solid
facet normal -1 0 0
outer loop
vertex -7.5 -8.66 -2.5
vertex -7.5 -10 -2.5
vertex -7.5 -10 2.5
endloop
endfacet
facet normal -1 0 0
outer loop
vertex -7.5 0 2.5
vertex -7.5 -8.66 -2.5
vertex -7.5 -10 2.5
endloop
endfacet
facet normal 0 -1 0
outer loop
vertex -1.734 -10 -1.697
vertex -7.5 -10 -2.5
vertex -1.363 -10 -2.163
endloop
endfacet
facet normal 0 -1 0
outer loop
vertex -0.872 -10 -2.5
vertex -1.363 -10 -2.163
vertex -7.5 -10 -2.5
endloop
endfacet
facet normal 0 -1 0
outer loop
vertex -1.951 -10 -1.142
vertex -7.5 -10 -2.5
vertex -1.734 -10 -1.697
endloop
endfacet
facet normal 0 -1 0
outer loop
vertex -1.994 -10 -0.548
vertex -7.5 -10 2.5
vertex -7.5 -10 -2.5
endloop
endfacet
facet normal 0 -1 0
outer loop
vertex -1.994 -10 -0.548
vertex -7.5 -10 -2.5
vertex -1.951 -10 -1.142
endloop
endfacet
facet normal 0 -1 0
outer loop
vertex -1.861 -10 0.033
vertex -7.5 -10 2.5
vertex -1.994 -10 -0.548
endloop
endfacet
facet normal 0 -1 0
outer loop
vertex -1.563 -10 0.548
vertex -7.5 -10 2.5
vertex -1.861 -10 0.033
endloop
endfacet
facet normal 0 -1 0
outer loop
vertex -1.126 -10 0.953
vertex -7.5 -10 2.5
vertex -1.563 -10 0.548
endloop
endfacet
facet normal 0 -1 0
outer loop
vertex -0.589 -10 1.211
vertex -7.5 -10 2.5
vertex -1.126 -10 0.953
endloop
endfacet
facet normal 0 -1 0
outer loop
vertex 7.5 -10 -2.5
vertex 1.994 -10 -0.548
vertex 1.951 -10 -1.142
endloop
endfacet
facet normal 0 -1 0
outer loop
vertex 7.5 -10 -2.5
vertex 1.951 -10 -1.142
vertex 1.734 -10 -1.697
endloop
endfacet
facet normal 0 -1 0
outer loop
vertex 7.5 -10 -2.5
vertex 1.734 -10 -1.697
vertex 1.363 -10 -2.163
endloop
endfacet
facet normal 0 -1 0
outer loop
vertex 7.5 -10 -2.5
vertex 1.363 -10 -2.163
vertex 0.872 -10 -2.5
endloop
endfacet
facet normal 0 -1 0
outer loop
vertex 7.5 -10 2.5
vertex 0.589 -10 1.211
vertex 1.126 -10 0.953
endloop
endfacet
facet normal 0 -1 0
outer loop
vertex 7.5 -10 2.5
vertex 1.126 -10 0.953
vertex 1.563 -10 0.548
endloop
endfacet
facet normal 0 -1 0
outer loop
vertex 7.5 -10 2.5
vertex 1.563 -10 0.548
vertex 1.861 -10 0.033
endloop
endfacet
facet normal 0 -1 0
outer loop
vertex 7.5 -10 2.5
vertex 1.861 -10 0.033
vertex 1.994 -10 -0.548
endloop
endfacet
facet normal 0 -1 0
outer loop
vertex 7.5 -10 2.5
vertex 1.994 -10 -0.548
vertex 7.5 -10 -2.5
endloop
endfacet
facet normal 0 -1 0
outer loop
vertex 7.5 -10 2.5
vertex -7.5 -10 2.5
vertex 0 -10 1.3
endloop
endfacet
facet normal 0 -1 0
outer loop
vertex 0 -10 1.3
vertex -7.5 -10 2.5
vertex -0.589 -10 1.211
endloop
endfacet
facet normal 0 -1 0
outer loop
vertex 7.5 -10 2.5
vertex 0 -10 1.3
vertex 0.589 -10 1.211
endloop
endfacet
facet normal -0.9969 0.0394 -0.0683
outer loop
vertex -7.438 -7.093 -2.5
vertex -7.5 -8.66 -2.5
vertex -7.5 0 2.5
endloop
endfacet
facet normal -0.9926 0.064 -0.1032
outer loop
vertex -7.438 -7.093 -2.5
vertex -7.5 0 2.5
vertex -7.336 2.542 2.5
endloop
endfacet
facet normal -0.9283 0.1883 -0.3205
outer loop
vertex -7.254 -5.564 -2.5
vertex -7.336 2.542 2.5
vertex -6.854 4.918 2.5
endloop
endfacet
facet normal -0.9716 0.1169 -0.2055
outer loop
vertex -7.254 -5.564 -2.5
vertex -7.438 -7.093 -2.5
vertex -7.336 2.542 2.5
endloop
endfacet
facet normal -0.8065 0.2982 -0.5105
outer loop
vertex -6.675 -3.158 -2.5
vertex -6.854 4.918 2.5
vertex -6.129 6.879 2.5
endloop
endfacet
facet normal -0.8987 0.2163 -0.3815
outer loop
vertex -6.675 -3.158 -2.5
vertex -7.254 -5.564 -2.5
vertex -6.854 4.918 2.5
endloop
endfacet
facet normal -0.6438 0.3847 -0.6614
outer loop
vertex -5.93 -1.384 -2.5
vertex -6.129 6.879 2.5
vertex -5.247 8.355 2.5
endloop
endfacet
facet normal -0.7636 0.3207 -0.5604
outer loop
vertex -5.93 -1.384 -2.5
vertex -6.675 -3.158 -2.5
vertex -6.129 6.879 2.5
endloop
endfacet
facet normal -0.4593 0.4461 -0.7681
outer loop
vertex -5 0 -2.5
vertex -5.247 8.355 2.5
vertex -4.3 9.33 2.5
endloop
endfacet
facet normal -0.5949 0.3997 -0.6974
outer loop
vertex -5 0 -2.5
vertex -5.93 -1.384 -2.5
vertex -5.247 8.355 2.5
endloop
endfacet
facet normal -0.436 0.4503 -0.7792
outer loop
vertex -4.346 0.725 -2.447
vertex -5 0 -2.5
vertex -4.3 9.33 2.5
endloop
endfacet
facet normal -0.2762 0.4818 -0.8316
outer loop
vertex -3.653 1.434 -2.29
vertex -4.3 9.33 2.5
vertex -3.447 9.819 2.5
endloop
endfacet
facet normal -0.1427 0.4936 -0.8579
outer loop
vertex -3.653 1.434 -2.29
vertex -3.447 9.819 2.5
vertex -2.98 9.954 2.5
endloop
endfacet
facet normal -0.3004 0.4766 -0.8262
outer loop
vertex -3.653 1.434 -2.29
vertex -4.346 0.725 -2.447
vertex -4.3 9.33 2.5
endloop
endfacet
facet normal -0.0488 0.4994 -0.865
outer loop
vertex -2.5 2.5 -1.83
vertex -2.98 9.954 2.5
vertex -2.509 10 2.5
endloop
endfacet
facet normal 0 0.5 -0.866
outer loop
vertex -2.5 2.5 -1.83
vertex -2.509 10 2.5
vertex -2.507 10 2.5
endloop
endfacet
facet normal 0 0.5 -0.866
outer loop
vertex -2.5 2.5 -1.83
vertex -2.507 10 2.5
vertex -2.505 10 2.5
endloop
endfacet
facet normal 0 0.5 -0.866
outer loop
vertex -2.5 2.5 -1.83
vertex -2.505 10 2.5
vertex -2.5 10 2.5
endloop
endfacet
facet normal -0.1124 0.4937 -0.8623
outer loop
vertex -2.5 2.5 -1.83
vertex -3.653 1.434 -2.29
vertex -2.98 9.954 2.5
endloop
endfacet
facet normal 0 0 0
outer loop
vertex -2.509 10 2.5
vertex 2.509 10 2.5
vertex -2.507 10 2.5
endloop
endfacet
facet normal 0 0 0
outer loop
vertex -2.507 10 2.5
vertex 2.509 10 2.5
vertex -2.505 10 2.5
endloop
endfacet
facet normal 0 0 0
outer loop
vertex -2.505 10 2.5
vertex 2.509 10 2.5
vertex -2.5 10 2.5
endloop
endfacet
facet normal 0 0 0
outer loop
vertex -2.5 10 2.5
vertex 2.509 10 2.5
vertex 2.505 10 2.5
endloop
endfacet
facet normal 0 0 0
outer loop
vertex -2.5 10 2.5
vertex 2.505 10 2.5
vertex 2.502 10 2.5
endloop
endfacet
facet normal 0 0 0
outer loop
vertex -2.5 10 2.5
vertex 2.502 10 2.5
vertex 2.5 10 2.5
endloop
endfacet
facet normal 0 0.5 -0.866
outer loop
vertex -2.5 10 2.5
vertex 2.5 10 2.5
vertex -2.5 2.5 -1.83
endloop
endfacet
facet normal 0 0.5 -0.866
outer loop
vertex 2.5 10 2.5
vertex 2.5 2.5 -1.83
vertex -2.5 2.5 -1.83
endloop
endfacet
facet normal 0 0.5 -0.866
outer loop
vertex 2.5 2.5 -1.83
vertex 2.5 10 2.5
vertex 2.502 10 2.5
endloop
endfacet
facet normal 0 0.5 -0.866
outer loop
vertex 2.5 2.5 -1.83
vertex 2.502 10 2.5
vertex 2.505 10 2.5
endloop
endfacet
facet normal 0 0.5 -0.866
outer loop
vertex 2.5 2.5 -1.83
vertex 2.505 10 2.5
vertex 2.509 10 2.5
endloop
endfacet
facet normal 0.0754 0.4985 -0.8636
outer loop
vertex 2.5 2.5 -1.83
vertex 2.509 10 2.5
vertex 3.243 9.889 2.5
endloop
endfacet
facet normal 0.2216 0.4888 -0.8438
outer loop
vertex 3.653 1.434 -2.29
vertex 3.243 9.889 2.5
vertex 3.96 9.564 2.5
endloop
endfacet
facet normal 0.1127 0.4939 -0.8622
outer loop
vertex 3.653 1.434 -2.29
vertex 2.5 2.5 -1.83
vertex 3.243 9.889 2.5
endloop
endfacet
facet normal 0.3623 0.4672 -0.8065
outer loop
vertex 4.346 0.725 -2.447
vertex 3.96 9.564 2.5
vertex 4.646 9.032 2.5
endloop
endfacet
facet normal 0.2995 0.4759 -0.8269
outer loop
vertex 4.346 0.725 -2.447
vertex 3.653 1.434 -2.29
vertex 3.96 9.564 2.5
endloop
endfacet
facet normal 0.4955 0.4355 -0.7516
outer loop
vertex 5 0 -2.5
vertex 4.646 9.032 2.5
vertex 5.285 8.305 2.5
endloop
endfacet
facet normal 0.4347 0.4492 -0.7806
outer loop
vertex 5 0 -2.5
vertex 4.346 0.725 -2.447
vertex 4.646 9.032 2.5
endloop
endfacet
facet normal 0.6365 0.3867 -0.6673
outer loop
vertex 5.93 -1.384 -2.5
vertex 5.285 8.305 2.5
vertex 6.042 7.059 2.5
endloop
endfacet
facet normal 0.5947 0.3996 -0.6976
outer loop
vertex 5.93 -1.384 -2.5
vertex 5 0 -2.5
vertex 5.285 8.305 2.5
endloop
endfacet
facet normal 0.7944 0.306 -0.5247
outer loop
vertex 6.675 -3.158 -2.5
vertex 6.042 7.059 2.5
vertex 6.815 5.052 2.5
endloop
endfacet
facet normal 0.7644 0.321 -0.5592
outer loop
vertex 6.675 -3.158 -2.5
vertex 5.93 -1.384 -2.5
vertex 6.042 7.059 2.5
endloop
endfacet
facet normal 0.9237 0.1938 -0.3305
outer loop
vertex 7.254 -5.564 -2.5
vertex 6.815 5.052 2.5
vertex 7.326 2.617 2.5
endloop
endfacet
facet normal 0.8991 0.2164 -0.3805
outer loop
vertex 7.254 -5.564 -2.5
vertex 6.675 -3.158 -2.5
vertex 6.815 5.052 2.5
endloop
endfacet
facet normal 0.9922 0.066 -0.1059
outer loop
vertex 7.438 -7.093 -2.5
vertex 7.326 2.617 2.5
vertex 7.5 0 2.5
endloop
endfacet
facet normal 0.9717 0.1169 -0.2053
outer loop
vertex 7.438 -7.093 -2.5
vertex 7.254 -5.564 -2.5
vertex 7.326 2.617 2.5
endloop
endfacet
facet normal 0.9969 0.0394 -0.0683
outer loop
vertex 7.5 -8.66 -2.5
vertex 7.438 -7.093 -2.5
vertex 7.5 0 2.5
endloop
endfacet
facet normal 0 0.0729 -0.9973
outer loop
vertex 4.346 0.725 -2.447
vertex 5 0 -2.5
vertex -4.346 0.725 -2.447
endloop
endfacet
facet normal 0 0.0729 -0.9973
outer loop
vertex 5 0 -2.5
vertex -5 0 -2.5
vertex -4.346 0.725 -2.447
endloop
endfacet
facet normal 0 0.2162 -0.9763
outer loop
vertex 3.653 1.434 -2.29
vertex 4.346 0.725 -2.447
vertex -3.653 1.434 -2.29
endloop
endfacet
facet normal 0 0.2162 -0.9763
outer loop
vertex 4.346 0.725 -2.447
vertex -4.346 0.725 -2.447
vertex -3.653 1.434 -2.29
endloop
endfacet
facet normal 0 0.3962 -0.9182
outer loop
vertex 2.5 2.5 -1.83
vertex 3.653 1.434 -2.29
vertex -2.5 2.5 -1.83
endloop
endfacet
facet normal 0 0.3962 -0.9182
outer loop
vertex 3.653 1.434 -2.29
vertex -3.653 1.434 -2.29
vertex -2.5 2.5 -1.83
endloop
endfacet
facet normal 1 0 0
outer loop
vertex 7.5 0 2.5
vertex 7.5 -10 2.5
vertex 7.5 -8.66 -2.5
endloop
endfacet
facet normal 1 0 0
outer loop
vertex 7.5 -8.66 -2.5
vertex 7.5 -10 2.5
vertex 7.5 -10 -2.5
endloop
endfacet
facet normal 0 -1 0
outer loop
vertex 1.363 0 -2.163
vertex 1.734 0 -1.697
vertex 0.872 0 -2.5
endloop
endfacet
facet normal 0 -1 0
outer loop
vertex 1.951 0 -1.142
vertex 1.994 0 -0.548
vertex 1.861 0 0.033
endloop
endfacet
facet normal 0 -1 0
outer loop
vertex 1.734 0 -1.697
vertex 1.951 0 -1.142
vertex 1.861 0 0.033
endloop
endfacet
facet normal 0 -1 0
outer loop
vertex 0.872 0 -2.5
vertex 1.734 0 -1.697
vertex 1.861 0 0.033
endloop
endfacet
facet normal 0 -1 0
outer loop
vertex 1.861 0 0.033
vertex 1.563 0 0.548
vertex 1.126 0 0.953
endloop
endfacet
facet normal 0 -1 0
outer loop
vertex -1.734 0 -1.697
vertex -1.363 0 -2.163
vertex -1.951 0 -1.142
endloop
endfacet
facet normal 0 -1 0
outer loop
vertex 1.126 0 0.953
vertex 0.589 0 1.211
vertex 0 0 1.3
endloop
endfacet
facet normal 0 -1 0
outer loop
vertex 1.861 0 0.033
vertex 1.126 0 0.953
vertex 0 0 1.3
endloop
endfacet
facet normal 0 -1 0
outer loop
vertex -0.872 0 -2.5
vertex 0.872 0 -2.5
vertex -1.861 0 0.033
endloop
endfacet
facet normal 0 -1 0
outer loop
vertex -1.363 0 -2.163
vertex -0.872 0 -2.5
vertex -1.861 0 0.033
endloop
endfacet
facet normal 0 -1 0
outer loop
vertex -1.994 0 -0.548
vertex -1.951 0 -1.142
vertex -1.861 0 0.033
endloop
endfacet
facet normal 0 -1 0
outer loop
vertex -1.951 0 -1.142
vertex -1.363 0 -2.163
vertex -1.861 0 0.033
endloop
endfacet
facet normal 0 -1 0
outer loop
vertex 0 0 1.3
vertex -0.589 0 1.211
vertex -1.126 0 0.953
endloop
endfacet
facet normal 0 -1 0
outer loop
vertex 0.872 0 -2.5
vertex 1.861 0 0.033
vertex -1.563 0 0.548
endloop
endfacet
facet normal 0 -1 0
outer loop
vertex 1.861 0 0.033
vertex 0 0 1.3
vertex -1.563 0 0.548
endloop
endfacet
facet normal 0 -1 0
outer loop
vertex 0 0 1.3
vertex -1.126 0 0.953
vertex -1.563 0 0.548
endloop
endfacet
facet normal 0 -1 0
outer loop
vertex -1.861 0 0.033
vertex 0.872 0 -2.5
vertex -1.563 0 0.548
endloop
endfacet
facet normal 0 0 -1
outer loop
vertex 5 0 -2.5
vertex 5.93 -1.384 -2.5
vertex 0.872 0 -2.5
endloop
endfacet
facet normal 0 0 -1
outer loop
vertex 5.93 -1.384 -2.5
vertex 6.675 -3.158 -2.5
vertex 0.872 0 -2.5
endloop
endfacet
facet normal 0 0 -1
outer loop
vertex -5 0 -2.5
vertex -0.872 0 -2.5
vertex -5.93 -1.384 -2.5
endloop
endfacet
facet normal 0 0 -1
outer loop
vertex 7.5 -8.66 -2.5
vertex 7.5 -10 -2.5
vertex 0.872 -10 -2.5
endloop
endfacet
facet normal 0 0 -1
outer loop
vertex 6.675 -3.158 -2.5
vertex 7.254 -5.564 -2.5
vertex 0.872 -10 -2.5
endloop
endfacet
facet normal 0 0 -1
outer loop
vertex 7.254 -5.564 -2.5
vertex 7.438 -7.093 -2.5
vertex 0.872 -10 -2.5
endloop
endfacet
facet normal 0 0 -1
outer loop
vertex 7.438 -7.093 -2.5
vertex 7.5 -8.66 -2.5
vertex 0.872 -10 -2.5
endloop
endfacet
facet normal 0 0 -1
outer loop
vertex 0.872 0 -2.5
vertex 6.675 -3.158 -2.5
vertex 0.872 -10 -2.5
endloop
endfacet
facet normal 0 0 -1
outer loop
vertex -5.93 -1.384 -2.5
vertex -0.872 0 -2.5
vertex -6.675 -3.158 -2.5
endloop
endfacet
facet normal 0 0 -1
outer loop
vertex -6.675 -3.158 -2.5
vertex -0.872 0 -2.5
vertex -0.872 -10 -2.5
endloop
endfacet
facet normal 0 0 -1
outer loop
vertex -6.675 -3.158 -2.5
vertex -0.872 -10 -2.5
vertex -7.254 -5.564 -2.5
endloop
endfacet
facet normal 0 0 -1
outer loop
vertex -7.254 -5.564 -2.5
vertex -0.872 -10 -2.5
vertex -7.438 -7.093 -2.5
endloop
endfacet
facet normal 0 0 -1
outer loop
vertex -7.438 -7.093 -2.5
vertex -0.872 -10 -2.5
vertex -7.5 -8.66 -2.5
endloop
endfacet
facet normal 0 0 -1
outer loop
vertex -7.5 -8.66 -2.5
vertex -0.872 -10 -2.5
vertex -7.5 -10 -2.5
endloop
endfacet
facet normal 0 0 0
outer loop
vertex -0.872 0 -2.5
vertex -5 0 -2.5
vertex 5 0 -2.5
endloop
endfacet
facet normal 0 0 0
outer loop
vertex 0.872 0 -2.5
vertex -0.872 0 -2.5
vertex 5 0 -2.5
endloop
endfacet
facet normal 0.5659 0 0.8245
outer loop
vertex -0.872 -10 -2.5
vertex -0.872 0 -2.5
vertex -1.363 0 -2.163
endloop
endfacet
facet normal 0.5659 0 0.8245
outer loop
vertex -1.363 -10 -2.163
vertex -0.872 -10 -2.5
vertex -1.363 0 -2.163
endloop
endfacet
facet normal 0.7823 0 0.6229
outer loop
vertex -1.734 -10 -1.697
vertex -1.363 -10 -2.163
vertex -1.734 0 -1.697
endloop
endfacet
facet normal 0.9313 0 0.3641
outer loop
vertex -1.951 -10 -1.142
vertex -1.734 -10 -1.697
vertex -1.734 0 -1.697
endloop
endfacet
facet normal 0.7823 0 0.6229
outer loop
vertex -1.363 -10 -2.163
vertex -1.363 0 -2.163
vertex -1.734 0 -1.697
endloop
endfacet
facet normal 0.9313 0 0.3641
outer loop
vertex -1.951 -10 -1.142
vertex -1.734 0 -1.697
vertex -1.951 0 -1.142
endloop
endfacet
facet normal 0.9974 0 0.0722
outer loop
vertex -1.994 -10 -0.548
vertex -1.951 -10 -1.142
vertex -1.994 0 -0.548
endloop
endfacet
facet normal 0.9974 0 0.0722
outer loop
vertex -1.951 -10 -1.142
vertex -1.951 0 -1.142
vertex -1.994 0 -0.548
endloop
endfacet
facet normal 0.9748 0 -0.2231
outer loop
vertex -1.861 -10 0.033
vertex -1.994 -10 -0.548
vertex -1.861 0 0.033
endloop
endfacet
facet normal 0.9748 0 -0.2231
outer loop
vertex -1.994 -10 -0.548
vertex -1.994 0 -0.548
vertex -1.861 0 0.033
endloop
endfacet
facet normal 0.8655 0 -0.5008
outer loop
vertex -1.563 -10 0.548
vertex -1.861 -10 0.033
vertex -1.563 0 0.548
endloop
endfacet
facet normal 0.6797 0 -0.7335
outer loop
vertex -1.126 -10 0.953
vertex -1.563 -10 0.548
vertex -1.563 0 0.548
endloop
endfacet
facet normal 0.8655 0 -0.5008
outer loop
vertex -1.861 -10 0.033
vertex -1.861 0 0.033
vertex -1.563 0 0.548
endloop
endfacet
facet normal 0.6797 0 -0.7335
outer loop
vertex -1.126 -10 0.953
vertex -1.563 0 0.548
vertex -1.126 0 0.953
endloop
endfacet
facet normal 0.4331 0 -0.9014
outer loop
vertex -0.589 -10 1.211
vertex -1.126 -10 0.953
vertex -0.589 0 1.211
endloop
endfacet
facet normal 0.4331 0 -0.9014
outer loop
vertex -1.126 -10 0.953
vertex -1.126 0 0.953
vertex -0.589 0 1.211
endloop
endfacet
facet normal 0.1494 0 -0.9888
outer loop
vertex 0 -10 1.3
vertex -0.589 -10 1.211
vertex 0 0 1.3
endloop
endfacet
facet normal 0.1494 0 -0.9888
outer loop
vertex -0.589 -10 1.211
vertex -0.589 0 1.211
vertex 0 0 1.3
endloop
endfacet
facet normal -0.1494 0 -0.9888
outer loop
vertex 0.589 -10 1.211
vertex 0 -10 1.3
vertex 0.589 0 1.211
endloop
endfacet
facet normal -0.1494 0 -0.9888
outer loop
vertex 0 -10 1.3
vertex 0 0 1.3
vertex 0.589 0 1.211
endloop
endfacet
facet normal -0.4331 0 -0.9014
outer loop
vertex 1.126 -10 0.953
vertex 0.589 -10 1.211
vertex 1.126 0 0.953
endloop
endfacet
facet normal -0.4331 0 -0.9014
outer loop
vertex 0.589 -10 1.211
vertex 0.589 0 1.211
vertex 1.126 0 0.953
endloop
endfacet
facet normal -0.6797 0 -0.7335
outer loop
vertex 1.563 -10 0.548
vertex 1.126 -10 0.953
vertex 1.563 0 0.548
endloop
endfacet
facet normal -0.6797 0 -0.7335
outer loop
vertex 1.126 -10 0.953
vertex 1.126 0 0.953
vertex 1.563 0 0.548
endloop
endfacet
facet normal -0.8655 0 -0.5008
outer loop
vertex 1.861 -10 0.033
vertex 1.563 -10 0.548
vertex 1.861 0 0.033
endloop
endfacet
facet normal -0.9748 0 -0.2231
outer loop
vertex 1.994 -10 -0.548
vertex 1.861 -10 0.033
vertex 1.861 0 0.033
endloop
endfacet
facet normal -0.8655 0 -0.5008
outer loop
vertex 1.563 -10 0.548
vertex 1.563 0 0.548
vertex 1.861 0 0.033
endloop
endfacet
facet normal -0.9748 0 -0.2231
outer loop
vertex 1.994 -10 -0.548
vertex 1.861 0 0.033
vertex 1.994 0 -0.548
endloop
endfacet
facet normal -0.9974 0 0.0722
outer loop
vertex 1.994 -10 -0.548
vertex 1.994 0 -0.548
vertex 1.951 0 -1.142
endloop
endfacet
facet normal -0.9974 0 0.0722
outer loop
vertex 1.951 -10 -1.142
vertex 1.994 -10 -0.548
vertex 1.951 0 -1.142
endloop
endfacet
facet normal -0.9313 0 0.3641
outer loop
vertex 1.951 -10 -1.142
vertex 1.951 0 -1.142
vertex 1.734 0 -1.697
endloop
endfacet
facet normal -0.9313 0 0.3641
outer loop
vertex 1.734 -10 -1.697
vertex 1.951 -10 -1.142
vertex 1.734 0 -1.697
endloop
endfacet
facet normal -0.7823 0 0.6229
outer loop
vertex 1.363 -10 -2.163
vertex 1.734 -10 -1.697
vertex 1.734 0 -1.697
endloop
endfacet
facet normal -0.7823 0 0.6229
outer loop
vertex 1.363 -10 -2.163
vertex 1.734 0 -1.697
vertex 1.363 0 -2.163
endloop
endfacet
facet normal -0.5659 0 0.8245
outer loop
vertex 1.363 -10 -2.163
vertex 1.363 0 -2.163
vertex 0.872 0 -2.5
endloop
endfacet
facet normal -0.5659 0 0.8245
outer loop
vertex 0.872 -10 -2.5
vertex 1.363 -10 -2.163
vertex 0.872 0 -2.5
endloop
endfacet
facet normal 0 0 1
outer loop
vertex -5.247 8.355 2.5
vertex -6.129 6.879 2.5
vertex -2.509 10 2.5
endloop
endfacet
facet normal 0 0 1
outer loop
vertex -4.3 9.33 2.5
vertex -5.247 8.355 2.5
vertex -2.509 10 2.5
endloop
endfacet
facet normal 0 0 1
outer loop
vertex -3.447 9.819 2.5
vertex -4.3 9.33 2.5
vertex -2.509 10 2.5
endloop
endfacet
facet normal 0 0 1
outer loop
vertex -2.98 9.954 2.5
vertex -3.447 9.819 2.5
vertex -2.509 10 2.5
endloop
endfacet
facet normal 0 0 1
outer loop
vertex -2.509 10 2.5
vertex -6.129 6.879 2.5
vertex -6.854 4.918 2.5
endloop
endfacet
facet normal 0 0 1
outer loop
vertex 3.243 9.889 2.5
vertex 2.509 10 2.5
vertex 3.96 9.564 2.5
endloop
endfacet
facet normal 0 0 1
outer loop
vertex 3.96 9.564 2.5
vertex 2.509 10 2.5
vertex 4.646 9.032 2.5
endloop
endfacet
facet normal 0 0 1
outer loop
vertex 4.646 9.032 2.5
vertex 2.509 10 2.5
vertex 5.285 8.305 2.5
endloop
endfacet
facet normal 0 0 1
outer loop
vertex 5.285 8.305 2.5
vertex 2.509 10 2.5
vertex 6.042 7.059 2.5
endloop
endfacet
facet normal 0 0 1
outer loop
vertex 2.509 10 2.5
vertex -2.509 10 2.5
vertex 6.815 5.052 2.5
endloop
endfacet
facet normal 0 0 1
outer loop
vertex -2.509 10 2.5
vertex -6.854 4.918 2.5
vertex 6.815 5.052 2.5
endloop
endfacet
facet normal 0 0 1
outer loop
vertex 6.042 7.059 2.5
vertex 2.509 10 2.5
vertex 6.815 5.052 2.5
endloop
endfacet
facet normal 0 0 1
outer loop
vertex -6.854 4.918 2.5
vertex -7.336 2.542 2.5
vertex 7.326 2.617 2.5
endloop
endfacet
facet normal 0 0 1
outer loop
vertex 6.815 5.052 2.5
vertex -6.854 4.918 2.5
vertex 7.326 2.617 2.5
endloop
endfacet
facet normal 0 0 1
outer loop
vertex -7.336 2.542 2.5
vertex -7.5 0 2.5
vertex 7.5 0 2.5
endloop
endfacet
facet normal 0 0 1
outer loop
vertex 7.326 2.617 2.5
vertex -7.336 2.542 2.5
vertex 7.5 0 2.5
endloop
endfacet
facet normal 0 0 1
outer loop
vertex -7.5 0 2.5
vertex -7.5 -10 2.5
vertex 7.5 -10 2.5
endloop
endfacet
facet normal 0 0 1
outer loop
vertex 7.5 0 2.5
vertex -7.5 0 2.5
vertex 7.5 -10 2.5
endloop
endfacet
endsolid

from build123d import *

# Parameters (mm, degrees)
F1_DEPTH = 10
F3_DEPTH = 10
F4_SIZE2 = 8.660244
F4_SIZE  = 4.99999
F5_R     = 5


# Not quite as in the source:
# - a fillet or chamfer is up to 0.001 mm smaller than in the source, because OpenCascade refuses the exact size


with BuildPart() as f1:
    # F0 (on Front) → F1 (new body)
    with BuildSketch(Plane.XZ):
        with BuildLine():
            Line((0.8717797887, -2.5), (7.5, -2.5))
            Line((7.5, -2.5), (7.5, 2.5))
            Line((7.5, 2.5), (-7.5, 2.5))
            Line((-7.5, 2.5), (-7.5, -2.5))
            Line((-7.5, -2.5), (-0.8717797887, -2.5))
            ThreePointArc((-0.8717797887, -2.5), (0, 1.3), (0.8717797887, -2.5))
        make_face()
    extrude(amount=F1_DEPTH)

    # F2 (on face) → F3 (join)
    with BuildSketch(Plane(origin=(0, 0, 0), x_dir=(-1, 0, 0), z_dir=(0, 1, 0))):
        with BuildLine():
            ThreePointArc((0.8717797887, -2.5), (0, 1.3), (-0.8717797887, -2.5))
            Line((-0.8717797887, -2.5), (0.8717797887, -2.5))
        make_face()
        with BuildLine():
            Line((7.5, 2.5), (-7.5, 2.5))
            Line((-7.5, 2.5), (-7.5, -2.5))
            Line((-7.5, -2.5), (-0.8717797887, -2.5))
            ThreePointArc((-0.8717797887, -2.5), (0, 1.3), (0.8717797887, -2.5))
            Line((0.8717797887, -2.5), (7.5, -2.5))
            Line((7.5, -2.5), (7.5, 2.5))
        make_face()
    extrude(amount=F3_DEPTH)

    # F4 (size 5 and 8.6602540378 in the source; OpenCascade refuses exactly that, so slightly less here)
    f4_edges = [f1.edges().sort_by_distance(p)[0] for p in [
        (0, 10, -2.5),
    ]]
    f4_side = f1.faces().sort_by_distance((0, 10, 0))[0]
    chamfer(f4_edges, length=F4_SIZE, length2=F4_SIZE2, reference=f4_side)

    # F5
    f5_edges = [f1.edges().sort_by_distance(p)[0] for p in [
        (0, 1.339756, -2.5),
        (7.5, 5.669878, -5e-06),
        (-7.5, 5.669878, -5e-06),
    ]]
    fillet(f5_edges, radius=F5_R)


solid = f1.part
